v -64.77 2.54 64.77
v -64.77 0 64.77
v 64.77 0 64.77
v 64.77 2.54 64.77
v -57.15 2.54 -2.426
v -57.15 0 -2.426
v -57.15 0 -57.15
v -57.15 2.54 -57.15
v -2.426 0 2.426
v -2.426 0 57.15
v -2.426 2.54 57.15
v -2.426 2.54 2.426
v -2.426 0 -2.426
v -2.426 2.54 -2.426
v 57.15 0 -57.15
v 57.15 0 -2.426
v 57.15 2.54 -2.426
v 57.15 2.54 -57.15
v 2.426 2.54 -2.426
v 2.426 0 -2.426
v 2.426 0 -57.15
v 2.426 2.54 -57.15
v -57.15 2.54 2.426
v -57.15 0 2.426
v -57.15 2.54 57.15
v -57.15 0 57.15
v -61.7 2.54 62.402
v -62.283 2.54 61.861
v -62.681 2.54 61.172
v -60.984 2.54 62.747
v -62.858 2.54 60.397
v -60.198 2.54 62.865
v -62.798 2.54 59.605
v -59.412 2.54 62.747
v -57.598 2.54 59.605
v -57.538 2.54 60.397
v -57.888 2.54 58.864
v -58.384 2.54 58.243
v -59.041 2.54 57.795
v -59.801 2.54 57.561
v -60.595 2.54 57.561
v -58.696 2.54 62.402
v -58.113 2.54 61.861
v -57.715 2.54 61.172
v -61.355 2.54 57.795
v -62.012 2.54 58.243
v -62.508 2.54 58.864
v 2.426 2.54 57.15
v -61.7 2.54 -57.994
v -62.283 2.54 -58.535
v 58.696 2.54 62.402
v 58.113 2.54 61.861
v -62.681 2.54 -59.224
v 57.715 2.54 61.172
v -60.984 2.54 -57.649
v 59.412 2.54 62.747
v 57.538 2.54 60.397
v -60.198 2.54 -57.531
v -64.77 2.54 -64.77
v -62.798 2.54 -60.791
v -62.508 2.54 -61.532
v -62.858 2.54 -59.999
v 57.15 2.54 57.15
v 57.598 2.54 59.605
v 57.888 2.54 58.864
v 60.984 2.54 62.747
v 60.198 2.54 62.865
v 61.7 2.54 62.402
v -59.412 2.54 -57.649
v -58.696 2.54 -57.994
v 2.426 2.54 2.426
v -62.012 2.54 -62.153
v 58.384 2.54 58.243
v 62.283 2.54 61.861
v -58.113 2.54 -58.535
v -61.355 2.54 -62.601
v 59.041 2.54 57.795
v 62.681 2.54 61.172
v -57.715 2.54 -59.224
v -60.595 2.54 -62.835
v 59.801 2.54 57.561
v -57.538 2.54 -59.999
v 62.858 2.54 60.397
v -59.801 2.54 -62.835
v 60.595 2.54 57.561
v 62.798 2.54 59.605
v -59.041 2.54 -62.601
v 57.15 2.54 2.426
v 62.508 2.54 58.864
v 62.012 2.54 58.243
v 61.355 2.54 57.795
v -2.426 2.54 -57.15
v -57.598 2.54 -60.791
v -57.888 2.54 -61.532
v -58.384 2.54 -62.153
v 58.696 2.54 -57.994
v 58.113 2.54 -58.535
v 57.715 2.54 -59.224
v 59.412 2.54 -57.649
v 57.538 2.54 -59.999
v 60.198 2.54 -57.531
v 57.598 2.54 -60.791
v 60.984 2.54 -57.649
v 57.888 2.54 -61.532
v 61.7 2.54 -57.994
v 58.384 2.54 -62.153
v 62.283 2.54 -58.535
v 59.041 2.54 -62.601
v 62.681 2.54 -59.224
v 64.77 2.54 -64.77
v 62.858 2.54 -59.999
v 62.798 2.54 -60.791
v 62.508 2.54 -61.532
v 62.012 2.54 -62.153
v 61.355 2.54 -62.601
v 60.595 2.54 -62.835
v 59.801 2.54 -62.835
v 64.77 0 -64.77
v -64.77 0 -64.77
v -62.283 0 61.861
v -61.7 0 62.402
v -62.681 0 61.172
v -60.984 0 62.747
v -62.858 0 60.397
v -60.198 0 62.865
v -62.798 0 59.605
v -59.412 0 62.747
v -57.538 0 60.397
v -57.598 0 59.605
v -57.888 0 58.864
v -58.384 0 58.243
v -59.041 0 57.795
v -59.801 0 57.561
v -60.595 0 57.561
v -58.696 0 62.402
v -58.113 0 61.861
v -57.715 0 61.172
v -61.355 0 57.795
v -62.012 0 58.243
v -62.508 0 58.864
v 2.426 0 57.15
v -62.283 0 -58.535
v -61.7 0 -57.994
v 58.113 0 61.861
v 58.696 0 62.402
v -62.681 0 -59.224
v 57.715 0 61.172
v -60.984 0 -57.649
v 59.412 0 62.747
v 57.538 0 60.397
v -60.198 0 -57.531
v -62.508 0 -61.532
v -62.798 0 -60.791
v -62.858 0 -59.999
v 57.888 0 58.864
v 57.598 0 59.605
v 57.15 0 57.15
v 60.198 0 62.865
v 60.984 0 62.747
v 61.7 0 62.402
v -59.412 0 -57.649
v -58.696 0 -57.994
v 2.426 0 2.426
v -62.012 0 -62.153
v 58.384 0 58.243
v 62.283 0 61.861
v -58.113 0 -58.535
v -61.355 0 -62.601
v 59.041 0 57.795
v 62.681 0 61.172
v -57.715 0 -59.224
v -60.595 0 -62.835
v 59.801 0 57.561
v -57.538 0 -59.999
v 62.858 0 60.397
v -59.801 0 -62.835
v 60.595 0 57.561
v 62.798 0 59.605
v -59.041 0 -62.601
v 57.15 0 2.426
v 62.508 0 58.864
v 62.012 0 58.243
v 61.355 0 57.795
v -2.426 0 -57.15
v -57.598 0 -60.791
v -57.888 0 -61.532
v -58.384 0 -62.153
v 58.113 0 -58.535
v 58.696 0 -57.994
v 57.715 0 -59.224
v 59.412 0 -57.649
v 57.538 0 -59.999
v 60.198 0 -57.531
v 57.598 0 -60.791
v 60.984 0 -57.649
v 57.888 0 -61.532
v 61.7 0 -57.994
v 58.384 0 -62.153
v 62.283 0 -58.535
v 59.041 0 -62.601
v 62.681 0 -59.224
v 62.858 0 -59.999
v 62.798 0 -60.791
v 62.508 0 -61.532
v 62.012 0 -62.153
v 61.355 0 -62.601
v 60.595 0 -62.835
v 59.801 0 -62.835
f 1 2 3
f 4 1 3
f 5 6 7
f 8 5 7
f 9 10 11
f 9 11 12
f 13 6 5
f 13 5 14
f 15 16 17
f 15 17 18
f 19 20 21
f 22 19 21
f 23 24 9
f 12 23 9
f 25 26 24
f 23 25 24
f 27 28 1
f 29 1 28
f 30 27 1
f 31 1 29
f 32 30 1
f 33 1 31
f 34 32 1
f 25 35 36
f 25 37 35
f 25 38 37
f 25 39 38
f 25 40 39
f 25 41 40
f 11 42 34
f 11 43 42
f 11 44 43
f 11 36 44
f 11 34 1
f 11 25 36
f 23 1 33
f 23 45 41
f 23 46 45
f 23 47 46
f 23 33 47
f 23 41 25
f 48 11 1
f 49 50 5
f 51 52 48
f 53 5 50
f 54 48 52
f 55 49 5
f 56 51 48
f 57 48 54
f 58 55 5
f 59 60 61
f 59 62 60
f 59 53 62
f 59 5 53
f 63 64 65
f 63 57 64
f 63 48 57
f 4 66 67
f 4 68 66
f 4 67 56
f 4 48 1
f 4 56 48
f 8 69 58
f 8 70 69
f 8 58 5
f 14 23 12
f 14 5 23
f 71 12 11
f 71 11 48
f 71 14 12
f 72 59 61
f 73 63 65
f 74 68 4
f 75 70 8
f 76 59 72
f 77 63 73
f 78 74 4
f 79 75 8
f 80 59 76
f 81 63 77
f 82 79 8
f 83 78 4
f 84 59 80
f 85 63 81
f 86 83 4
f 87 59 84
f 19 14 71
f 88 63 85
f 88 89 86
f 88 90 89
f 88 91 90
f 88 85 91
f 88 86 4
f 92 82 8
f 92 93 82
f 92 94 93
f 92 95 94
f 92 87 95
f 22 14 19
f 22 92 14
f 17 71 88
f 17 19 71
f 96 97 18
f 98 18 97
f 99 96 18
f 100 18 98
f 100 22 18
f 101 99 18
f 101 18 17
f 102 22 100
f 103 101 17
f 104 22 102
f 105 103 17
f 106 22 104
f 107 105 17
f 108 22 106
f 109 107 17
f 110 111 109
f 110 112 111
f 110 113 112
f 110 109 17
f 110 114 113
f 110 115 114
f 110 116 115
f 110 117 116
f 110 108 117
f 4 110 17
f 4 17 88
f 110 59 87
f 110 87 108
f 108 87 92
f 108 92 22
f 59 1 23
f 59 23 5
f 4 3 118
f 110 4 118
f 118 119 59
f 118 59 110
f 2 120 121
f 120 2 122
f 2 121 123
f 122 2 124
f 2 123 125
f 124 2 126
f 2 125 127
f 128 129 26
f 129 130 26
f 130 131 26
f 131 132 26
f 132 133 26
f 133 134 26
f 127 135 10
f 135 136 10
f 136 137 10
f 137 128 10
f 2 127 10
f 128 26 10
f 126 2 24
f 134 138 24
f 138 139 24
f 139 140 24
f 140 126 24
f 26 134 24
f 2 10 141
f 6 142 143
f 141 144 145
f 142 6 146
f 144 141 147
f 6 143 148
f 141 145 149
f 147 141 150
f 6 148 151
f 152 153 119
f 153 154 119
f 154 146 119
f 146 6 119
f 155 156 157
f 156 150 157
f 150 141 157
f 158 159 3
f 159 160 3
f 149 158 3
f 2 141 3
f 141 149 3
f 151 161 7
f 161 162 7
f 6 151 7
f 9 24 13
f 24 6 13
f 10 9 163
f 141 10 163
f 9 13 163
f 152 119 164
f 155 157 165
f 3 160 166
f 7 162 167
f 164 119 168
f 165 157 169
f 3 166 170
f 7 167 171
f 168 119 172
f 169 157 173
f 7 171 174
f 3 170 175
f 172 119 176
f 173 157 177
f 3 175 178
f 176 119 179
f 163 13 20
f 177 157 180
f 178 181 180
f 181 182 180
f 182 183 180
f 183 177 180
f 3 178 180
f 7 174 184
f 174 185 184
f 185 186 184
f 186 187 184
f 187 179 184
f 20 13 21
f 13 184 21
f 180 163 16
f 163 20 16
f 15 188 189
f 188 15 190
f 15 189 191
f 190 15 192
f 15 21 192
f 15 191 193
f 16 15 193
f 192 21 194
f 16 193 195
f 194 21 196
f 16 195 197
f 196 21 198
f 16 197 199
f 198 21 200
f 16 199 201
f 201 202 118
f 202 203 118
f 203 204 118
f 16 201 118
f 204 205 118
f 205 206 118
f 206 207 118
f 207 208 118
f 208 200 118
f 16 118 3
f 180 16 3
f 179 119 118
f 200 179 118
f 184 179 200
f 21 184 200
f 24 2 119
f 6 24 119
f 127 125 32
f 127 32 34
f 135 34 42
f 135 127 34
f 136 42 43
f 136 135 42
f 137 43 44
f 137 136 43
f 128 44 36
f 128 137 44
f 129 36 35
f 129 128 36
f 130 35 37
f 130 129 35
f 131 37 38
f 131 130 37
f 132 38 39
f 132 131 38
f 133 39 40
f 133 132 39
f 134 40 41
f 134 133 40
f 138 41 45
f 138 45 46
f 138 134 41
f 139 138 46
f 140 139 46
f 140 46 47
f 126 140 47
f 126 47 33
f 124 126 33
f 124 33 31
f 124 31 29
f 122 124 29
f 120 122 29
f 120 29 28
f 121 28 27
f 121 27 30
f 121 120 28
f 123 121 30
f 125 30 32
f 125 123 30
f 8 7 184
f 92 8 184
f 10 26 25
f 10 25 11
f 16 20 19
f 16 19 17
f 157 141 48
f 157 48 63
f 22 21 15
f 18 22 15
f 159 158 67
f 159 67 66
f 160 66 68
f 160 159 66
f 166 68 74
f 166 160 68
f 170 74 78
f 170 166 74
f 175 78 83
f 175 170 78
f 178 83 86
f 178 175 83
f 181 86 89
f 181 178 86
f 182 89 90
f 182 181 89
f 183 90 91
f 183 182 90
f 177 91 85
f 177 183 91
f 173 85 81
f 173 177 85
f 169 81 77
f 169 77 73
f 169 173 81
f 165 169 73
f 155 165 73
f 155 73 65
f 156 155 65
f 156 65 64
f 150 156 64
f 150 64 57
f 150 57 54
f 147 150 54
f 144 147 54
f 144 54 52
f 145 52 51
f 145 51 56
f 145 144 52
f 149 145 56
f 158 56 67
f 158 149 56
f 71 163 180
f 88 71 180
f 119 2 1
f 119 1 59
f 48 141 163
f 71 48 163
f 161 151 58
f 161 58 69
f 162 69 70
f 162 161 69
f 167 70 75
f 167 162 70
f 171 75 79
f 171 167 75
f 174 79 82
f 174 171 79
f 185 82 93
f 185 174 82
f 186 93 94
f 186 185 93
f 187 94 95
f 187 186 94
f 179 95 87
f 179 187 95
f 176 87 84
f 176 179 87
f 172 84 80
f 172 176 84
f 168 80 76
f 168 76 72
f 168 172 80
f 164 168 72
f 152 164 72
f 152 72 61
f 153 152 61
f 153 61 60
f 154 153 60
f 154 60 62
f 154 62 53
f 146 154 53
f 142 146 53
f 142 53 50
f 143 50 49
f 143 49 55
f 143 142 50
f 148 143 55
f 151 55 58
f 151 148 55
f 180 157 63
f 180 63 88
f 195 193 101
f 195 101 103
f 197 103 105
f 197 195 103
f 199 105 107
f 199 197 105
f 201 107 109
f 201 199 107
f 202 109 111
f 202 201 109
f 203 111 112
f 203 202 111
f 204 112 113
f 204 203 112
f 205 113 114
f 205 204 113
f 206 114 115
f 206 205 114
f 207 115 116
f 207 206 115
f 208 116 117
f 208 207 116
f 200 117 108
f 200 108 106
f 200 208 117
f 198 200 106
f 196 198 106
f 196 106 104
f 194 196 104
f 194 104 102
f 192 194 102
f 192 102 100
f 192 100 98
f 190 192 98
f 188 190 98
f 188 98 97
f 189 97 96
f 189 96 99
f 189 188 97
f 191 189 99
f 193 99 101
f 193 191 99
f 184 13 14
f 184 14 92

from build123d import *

# Parameters (mm, degrees)
SKETCH1_W           = 129.54
SKETCH1_H           = 129.54
SKETCH1_R           = 2.667
SKETCH1_W_2         = 114.3
SKETCH1_H_2         = 114.3
SKETCH1_H_3         = 4.852699468
SKETCH1_W_3         = 4.852699468
BOSS_EXTRUDE1_DEPTH = 2.54


with BuildPart() as part:
    # Sketch1 → Boss-Extrude1 (new body)
    # profile 1 of 3: a face of its own
    with BuildSketch(Plane(origin=(0, 0, 0), x_dir=(1, 0, 0), z_dir=(0, 1, 0))):
        Rectangle(SKETCH1_W, SKETCH1_H)
        with Locations(Location((-60.198, -60.198, 0), (0, 0, 270))):
            Circle(SKETCH1_R, mode=Mode.SUBTRACT)
        with Locations(Location((60.198, -60.198, 0), (0, 0, 270))):
            Circle(SKETCH1_R, mode=Mode.SUBTRACT)
        with Locations(Location((-60.198, 60.198, 0), (0, 0, 270))):
            Circle(SKETCH1_R, mode=Mode.SUBTRACT)
        with Locations(Location((60.198, 60.198, 0), (0, 0, 270))):
            Circle(SKETCH1_R, mode=Mode.SUBTRACT)
        Rectangle(SKETCH1_W_2, SKETCH1_H_2, mode=Mode.SUBTRACT)
    # profile 2 of 3: a face of its own
    with BuildSketch(Plane(origin=(0, 0, 0), x_dir=(1, 0, 0), z_dir=(0, 1, 0))):
        Rectangle(SKETCH1_W, SKETCH1_H_3)
    # profile 3 of 3: a face of its own
    with BuildSketch(Plane(origin=(0, 0, 0), x_dir=(1, 0, 0), z_dir=(0, 1, 0))):
        Rectangle(SKETCH1_W_3, SKETCH1_H)
    extrude(amount=BOSS_EXTRUDE1_DEPTH)


solid = part.part
